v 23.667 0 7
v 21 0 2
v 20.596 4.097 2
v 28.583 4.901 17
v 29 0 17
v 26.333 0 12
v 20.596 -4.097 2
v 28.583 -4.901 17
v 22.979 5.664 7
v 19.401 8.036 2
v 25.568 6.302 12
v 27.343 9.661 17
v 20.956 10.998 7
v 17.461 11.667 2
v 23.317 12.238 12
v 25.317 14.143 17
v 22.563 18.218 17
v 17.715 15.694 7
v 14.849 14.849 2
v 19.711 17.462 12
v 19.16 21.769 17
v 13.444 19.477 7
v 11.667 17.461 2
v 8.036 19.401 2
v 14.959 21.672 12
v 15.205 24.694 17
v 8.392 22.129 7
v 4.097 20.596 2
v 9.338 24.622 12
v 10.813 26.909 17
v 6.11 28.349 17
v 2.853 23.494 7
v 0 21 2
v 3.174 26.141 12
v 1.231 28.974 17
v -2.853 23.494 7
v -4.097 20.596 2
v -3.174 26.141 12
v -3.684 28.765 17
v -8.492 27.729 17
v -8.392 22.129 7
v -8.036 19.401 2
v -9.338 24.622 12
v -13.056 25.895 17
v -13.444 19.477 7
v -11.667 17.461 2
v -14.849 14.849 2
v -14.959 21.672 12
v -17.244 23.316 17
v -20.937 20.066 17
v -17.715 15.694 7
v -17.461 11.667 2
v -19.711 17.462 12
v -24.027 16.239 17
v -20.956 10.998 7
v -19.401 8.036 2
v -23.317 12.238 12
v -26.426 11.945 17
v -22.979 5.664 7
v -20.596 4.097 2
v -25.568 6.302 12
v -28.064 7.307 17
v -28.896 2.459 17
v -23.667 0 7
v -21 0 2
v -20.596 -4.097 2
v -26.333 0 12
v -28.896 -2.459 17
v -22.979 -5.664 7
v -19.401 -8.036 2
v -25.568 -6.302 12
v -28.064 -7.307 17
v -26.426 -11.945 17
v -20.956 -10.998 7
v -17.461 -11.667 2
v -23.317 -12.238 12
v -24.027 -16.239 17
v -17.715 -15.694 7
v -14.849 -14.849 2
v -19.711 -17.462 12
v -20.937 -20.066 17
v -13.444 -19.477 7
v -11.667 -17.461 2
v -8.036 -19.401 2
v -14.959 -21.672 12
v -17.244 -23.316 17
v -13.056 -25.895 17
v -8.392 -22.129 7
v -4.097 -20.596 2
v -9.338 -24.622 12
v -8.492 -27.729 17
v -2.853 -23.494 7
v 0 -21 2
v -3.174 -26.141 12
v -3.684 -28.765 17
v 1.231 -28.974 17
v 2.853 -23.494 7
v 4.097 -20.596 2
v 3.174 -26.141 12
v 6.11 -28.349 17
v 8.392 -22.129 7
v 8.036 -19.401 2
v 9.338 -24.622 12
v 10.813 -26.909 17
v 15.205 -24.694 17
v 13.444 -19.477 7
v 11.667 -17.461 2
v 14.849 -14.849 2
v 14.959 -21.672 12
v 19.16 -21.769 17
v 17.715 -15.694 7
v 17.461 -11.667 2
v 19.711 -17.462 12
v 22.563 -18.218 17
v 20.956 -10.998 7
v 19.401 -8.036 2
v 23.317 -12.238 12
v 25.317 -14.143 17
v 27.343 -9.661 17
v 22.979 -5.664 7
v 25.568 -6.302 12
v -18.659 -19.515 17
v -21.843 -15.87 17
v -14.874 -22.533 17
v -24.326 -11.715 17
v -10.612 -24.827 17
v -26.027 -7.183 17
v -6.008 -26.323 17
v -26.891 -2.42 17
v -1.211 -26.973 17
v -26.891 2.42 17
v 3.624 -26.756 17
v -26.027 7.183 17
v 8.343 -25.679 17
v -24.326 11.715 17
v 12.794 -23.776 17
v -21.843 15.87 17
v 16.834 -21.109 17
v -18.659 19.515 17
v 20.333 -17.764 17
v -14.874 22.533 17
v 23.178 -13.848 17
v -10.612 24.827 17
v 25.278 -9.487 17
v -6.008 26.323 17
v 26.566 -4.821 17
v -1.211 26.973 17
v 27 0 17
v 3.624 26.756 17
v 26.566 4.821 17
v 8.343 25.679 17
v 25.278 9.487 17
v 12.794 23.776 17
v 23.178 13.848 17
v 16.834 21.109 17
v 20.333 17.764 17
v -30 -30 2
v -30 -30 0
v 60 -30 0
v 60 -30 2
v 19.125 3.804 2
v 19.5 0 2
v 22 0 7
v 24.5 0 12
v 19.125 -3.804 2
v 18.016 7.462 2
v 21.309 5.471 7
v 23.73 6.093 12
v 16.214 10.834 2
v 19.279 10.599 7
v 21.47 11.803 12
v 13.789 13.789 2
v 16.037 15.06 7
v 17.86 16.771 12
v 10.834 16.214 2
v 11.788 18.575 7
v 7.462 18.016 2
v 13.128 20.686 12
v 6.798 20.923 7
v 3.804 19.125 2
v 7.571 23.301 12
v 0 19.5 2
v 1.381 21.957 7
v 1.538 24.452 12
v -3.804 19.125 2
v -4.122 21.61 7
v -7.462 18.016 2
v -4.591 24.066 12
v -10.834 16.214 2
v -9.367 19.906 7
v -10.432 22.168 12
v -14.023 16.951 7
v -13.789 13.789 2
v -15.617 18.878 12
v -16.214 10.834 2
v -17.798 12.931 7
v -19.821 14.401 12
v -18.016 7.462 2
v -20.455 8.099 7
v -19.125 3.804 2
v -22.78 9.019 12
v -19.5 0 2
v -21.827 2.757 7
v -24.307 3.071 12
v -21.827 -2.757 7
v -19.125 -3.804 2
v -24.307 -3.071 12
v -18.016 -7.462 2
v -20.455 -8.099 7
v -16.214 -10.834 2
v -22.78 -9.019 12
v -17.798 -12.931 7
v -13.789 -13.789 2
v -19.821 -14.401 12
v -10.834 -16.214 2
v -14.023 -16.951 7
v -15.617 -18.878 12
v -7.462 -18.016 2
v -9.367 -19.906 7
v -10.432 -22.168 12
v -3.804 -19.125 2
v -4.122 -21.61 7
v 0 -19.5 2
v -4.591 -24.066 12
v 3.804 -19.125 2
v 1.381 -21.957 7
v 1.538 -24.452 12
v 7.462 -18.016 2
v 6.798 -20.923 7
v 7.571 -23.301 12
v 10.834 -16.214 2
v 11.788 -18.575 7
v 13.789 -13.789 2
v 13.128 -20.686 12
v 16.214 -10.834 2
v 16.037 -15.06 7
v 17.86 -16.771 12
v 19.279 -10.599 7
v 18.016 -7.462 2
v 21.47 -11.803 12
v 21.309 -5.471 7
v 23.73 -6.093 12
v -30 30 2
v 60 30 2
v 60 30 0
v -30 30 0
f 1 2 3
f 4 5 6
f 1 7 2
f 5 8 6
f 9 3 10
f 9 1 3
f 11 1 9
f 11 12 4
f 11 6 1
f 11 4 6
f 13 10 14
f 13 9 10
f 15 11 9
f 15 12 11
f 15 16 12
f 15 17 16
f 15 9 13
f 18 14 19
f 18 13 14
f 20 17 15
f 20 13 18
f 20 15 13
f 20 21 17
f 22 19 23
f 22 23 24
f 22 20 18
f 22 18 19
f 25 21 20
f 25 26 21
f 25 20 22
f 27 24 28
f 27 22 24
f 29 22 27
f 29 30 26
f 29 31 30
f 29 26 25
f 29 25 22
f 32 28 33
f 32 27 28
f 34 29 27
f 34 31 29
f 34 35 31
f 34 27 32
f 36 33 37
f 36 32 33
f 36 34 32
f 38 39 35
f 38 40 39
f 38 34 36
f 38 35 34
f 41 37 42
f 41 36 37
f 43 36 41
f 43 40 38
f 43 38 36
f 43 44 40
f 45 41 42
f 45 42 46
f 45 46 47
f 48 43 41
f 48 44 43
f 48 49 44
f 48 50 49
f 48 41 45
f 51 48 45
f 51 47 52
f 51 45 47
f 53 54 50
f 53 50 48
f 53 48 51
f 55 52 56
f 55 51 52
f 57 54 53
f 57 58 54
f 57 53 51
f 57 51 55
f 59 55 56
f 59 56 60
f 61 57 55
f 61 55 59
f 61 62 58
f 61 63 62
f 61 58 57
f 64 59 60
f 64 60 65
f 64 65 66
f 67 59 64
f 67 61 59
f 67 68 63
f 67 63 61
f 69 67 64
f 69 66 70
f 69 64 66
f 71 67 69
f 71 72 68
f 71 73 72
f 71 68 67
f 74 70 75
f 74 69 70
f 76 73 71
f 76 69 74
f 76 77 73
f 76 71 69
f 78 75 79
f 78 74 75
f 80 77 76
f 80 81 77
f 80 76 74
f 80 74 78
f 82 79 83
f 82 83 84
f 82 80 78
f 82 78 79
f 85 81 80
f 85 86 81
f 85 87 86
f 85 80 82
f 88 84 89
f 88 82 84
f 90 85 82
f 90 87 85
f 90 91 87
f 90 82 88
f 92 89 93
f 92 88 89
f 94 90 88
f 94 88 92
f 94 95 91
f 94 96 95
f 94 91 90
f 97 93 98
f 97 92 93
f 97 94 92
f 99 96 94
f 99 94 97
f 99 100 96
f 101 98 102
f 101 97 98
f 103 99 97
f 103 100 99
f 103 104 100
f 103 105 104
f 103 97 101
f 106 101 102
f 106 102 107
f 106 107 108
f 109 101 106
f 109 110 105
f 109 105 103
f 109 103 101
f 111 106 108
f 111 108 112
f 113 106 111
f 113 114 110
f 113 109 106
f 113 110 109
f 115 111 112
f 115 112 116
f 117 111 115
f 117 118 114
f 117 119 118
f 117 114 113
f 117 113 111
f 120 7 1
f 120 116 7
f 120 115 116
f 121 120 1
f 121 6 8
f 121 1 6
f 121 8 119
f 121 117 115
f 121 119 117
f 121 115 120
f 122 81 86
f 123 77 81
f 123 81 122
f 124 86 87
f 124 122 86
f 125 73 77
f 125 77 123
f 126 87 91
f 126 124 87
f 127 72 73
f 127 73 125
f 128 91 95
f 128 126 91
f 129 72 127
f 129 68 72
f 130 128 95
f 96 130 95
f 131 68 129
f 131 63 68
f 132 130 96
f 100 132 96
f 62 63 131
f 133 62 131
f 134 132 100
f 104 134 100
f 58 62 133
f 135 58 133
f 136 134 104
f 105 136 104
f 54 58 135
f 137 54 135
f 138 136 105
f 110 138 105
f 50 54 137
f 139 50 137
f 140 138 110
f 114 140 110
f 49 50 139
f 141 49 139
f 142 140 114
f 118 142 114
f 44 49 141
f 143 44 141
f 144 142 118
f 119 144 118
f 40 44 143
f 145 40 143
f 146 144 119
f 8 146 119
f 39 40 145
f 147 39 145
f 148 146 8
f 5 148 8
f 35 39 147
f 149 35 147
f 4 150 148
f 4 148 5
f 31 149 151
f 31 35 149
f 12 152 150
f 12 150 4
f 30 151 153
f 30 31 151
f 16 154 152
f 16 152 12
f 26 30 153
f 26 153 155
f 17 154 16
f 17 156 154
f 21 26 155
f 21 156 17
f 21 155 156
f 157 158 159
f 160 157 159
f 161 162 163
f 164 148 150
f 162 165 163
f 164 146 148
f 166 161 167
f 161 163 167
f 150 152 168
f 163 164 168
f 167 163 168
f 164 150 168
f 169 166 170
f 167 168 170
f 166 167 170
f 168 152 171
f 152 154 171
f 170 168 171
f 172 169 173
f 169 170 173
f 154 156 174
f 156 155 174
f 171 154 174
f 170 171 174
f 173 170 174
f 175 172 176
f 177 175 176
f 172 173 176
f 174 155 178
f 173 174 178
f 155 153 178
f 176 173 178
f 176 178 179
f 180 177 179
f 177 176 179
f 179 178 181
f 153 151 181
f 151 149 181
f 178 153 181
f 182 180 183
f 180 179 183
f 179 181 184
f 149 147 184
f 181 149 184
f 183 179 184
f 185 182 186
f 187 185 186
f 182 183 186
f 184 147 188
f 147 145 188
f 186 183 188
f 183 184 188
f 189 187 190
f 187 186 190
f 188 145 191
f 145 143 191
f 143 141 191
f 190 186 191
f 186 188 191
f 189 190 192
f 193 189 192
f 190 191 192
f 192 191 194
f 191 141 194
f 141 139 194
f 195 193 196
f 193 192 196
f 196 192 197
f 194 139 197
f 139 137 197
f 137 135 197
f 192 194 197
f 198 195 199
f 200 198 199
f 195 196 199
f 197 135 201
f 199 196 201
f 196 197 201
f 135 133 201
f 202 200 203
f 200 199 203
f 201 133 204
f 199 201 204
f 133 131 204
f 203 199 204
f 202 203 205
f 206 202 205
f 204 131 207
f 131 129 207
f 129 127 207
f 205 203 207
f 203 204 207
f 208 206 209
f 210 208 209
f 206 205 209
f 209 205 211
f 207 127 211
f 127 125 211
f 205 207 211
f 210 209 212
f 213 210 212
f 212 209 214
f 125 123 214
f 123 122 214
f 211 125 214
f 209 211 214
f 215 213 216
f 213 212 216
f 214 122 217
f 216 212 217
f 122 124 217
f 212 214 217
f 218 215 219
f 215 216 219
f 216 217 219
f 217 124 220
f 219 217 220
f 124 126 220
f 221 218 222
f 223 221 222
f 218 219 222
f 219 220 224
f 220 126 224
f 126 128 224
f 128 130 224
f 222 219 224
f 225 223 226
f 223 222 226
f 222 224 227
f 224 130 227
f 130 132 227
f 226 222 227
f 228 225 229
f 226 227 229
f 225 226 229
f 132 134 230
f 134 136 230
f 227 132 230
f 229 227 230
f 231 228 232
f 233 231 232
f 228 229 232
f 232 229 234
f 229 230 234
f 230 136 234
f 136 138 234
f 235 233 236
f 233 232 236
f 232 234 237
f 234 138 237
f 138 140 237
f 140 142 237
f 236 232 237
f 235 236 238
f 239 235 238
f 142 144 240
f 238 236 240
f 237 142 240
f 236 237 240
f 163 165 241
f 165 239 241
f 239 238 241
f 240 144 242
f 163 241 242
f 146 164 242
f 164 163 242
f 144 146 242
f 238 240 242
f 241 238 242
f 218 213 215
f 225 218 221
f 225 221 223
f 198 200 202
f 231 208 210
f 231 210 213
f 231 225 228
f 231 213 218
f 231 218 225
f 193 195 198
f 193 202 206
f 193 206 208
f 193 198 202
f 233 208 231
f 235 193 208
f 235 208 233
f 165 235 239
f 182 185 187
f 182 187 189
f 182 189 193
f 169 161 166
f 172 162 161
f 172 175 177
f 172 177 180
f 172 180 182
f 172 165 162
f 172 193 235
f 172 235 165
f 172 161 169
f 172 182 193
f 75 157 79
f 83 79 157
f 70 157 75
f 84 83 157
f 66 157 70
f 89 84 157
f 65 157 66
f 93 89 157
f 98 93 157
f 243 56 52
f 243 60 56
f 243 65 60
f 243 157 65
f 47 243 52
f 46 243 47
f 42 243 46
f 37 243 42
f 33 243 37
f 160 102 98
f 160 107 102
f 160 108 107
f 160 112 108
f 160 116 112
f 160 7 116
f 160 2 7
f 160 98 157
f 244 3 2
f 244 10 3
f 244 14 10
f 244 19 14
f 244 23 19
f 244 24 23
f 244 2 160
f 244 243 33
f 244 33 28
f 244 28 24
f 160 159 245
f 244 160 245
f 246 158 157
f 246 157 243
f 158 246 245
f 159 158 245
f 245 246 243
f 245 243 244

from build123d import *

# Parameters (mm, degrees)
SKETCH_W  = 90
SKETCH_H  = 60
PAD_DEPTH = 2


with BuildPart() as pad:
    # Sketch → Pad (new body)
    with BuildSketch(Plane.XY):
        with Locations((15, 0)):
            Rectangle(SKETCH_W, SKETCH_H)
    extrude(amount=PAD_DEPTH)


with BuildPart() as cone:
    # Cone → Cone (revolve)
    with BuildSketch(Plane.XZ):
        Polygon((0, 0), (19.5, 0), (27, 15), (0, 15), align=None)
    revolve(axis=Axis((0, 0, 0), (0, 0, 1)))


with BuildPart() as fusion:
    # Cone001 → Cone001 (revolve)
    with BuildSketch(Plane.XZ):
        Polygon((0, 0), (21, 0), (29, 15), (0, 15), align=None)
    revolve(axis=Axis((0, 0, 0), (0, 0, 1)))

    # Cut: cut Cone
    add(cone.part, mode=Mode.SUBTRACT)


with BuildPart() as fusion_1:
    # Cut placement: moved
    add(fusion.part.moved(Location((0, 0, 2))))

    # Fusion: union Pad
    add(pad.part)


solid = fusion_1.part
